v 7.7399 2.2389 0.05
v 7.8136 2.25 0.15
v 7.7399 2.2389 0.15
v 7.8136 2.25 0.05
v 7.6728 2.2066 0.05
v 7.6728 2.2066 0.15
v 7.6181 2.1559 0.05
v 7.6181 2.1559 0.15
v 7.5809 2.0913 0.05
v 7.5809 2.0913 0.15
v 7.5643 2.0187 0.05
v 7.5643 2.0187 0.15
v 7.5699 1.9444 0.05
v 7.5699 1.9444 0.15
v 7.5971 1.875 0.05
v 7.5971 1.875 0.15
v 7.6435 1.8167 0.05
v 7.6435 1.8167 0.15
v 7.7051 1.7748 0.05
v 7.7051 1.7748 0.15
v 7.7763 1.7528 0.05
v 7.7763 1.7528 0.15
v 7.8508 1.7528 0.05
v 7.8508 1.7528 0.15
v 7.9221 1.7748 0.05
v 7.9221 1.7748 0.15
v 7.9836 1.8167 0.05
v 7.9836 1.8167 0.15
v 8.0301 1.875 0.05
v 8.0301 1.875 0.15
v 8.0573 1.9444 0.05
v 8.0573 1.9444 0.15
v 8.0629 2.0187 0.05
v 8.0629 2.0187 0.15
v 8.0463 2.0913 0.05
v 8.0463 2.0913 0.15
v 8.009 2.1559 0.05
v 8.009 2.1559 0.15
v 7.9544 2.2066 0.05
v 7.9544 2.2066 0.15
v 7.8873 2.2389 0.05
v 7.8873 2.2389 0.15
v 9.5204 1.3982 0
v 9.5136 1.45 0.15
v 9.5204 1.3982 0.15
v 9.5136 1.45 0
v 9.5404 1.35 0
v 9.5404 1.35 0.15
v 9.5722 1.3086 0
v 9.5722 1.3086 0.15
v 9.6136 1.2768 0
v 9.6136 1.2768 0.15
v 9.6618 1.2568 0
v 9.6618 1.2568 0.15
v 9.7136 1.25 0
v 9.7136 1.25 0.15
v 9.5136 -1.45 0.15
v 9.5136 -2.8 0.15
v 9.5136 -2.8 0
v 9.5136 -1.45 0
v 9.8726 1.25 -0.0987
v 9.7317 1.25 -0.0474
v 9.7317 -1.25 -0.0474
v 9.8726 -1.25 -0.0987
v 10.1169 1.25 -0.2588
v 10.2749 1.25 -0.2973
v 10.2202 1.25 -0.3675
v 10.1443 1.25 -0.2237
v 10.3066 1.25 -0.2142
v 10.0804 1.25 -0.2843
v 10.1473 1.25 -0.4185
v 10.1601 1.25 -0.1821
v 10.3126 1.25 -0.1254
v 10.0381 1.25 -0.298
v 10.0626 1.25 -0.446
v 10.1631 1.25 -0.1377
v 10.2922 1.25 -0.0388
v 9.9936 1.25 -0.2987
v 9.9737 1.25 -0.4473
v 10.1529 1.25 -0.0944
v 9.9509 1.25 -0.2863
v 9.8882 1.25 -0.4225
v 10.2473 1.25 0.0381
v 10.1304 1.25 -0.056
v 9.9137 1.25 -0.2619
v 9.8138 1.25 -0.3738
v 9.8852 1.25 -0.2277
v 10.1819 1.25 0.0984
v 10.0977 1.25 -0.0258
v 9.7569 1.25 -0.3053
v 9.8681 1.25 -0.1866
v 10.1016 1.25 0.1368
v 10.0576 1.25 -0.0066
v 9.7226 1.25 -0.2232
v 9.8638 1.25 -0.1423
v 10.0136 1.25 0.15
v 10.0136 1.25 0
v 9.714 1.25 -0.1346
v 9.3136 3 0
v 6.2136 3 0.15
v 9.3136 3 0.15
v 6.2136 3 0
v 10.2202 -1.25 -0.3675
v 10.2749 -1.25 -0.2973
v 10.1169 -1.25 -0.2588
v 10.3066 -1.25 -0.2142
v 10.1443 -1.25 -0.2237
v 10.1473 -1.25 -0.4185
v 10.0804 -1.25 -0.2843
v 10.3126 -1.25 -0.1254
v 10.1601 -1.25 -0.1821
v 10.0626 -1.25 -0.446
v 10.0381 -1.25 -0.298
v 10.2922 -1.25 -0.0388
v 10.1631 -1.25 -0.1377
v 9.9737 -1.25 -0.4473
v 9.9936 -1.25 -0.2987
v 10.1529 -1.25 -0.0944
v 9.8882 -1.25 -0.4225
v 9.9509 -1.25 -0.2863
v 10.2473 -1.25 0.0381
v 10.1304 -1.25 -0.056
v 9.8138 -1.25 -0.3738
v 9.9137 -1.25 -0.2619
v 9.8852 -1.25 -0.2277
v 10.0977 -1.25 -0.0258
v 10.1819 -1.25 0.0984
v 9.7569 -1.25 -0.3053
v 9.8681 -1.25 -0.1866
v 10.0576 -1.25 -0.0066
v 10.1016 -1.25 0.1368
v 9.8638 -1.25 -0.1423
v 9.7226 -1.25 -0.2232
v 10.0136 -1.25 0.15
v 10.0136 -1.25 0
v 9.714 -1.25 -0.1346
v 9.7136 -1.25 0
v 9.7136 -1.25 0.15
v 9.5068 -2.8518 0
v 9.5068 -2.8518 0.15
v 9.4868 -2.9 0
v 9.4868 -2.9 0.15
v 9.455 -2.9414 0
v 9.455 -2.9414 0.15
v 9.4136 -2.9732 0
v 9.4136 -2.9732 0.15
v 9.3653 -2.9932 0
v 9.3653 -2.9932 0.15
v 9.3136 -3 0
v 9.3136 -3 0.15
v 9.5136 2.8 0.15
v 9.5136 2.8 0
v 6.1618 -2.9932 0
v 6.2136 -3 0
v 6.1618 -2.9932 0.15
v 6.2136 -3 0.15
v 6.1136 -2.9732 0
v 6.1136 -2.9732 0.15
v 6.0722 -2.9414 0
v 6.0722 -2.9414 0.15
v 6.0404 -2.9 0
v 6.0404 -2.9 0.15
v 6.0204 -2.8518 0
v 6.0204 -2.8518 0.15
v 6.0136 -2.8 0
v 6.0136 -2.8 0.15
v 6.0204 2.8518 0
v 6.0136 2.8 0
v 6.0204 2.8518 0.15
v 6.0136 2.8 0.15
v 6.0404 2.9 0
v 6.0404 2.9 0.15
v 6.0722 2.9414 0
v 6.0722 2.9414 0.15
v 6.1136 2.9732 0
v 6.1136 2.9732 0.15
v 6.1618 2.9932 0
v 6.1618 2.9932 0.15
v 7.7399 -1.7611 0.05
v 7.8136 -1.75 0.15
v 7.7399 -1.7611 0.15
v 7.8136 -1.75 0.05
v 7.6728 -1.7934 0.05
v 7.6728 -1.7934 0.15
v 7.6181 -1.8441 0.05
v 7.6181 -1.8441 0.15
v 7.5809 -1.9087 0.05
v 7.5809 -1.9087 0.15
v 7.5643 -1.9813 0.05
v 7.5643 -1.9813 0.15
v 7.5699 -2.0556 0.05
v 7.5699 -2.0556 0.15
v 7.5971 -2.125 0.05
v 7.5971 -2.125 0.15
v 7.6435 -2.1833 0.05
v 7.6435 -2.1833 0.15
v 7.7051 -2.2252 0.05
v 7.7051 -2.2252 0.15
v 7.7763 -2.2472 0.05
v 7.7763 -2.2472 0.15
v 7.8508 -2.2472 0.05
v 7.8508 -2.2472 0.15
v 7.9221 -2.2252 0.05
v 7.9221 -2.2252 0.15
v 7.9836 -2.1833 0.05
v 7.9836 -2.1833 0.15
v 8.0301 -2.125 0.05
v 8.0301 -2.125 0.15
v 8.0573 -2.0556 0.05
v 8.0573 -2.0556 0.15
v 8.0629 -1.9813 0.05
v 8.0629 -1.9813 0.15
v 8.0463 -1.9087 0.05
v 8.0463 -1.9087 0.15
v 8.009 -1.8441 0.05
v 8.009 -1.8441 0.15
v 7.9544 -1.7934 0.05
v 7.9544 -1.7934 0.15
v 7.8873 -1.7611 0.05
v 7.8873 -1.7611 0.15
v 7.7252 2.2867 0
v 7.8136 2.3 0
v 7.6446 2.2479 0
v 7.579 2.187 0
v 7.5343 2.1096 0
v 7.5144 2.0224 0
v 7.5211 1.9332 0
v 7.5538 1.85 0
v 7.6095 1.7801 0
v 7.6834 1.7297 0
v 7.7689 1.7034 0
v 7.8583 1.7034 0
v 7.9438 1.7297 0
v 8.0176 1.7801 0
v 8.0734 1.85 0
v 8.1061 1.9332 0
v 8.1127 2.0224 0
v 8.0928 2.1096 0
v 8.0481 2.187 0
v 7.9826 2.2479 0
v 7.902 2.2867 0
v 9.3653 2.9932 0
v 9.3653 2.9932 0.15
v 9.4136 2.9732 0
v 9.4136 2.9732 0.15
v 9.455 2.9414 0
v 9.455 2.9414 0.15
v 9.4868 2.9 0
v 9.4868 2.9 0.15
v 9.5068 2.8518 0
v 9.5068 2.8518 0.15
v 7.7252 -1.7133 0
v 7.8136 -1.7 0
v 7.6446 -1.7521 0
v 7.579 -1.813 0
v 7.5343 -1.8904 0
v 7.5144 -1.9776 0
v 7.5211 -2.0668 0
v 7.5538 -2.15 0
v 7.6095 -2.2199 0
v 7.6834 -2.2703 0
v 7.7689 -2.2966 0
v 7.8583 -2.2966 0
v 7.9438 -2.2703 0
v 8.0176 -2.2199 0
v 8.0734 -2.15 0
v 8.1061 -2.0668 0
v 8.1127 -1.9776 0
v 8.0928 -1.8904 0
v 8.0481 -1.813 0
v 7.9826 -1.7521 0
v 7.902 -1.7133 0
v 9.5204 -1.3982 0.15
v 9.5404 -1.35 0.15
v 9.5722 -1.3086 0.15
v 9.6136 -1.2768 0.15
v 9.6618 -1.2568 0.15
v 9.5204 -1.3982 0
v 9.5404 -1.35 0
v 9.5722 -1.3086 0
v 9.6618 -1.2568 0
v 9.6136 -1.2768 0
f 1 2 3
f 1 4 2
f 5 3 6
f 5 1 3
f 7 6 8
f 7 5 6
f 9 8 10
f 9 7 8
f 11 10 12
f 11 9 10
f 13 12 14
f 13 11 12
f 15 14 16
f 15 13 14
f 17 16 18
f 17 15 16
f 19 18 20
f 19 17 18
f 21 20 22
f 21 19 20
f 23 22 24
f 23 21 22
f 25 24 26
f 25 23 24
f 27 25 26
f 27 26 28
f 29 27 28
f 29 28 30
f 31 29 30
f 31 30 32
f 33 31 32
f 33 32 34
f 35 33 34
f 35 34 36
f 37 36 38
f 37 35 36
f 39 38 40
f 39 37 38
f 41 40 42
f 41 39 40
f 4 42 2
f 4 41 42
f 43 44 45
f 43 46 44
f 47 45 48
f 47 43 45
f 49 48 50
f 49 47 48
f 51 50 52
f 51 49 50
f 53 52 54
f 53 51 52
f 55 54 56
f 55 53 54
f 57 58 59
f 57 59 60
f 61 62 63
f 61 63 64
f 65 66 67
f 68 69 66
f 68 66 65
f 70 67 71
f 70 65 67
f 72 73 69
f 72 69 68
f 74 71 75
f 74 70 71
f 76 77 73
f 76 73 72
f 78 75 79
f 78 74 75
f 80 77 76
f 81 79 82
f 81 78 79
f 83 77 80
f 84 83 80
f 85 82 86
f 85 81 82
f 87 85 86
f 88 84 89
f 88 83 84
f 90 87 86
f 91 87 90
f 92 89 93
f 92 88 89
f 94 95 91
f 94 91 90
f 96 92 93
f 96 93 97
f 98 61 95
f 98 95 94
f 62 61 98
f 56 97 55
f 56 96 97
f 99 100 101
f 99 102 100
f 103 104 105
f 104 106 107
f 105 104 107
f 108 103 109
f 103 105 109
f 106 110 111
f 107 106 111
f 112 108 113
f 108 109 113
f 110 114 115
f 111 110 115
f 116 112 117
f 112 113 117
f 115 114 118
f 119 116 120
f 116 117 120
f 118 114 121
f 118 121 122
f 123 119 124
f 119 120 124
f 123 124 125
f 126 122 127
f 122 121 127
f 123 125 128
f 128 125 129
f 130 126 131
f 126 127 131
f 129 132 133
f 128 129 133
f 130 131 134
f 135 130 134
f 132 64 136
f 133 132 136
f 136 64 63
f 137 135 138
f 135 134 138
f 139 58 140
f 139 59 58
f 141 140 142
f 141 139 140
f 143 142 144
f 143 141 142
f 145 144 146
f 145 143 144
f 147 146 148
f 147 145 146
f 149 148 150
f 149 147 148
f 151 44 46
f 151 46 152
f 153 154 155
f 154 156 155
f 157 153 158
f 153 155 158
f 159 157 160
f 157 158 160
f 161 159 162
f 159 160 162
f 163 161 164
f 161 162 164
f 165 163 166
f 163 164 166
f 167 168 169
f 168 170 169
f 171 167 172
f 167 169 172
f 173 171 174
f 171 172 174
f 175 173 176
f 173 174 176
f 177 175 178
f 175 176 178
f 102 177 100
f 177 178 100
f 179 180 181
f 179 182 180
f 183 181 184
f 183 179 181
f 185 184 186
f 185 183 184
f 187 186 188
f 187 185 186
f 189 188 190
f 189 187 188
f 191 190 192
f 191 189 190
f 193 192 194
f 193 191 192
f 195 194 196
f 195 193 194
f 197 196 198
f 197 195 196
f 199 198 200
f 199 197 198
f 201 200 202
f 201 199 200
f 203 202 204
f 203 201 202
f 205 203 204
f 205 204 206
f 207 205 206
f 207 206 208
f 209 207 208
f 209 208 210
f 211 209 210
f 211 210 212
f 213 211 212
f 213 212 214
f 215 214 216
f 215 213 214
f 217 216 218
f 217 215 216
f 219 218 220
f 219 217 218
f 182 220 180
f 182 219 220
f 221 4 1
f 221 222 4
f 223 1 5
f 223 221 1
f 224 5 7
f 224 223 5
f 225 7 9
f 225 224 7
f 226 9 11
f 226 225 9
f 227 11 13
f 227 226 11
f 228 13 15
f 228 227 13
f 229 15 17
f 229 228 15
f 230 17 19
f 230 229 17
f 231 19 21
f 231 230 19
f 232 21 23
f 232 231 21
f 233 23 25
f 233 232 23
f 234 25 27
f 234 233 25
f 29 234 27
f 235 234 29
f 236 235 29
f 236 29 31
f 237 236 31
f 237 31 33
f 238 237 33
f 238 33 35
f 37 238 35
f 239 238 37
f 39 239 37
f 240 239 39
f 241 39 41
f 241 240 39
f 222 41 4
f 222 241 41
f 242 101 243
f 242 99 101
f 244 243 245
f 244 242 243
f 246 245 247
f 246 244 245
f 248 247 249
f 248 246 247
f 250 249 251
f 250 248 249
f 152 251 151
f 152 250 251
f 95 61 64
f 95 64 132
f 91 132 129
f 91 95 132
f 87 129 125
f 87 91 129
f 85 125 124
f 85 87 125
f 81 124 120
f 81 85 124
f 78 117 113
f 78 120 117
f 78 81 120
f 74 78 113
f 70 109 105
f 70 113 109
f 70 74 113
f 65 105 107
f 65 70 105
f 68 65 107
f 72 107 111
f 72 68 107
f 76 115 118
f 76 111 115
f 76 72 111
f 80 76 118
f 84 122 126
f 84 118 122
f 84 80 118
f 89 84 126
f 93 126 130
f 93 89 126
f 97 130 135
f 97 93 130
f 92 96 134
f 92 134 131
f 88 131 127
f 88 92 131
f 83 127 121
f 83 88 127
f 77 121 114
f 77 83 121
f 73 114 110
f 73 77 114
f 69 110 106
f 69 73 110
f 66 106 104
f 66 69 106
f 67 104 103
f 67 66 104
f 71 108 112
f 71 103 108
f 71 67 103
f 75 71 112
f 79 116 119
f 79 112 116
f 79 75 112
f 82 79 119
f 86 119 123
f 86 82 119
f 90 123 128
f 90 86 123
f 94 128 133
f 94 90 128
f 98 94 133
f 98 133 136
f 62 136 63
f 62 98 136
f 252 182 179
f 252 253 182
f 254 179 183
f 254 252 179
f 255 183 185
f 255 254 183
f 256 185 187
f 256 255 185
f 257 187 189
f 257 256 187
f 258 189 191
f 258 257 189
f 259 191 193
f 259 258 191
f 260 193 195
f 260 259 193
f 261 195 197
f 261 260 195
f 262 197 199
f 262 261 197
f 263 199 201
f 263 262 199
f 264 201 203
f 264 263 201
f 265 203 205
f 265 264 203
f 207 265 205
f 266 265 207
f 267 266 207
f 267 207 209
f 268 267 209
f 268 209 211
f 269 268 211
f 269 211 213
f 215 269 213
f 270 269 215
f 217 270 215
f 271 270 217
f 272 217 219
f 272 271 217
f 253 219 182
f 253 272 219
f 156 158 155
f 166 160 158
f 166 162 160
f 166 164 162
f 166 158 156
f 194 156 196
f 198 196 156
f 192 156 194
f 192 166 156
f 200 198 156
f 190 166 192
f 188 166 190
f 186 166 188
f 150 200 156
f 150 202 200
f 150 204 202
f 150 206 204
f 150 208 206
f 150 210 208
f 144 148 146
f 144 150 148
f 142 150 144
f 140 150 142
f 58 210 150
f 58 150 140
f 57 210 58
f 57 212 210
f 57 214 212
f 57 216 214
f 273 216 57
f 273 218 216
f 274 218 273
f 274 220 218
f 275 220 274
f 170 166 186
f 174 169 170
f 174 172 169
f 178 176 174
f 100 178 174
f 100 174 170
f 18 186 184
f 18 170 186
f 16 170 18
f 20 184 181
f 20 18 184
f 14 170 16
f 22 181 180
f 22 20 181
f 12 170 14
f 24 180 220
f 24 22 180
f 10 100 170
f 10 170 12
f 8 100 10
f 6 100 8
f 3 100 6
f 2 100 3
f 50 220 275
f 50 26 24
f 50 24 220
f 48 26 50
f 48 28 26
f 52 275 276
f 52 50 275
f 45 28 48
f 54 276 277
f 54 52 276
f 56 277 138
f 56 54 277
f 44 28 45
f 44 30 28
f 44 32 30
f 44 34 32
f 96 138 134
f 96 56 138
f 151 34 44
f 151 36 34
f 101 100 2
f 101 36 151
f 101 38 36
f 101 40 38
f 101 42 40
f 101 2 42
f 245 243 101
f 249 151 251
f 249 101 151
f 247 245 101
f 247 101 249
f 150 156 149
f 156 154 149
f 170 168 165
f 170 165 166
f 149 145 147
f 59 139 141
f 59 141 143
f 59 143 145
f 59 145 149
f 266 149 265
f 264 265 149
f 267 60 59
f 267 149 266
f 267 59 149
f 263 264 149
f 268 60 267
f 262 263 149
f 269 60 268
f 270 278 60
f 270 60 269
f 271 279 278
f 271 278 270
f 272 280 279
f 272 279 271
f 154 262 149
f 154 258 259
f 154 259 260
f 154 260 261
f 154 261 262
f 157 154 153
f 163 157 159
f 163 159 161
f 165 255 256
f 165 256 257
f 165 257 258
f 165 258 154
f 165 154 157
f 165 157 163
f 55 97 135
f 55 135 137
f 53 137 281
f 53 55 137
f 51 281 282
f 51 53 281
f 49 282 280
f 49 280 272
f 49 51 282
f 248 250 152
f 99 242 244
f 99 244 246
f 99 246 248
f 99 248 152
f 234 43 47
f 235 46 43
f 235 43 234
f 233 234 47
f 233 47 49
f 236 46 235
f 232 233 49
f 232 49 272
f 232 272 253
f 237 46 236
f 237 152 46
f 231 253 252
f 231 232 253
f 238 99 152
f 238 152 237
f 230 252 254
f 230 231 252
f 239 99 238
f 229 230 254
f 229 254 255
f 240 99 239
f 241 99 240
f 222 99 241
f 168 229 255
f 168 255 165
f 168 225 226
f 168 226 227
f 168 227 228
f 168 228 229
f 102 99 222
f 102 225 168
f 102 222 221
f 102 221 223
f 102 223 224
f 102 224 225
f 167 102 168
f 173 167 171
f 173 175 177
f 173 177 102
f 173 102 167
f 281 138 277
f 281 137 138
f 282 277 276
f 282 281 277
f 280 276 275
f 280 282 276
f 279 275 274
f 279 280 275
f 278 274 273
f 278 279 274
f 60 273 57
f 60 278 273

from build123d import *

# Parameters (mm, degrees)
BASE_FLANGE1_DEPTH                             = 3
CUT_EXTRUDE1_DEPTH                             = 11.75046698
CUT_EXTRUDE1_DEPTH_BACK                        = 11.75046698
SKETCH10_W                                     = 0.8
SKETCH10_H                                     = 1.75
FILLET1_R                                      = 0.2
CSK_FOR_M3_FLAT_HEAD_MACHINE_SCREW1_AT_2_COUNT = 2
CSK_FOR_M3_FLAT_HEAD_MACHINE_SCREW1_AT_2_PITCH = 4


# Sheet-metal steps are written as plain solids
with BuildPart() as part:
    # Sketch5 → Base-Flange1 (new, symmetric)
    with BuildSketch(Plane(origin=(0, 0, 0), x_dir=(1, 0, 0), z_dir=(0, 1, 0))):
        with BuildLine():
            ThreePointArc((9.872631336, 0.098696979), (10.099621695, 0.272872807), (10.013585229, 0))
            Line((10.013585229, 0), (6.013585229, 0))
            Line((6.013585229, 0), (6.013585229, -0.15))
            Line((6.013585229, -0.15), (10.013585229, -0.15))
            ThreePointArc((10.013585229, -0.15), (10.18565816, 0.395745613), (9.731677443, 0.047393957))
            Line((9.731677443, 0.047393957), (9.872631336, 0.098696979))
        make_face()
    extrude(amount=BASE_FLANGE1_DEPTH, both=True)

    # Sketch10 → Cut-Extrude1 (cut, two sides: drawn at the far end of the back side and taken through both)
    with BuildSketch(Plane(origin=(0, 0, 0), x_dir=(-1, 0, 0), z_dir=(0, 0, -1)).offset(-CUT_EXTRUDE1_DEPTH_BACK)):
        with Locations((-9.913585229, 2.125)):
            Rectangle(SKETCH10_W, SKETCH10_H)
        with Locations((-9.913585229, -2.125)):
            Rectangle(SKETCH10_W, SKETCH10_H)
    extrude(amount=CUT_EXTRUDE1_DEPTH + CUT_EXTRUDE1_DEPTH_BACK, mode=Mode.SUBTRACT)

    # Fillet1
    fillet1_edges = [part.edges().sort_by_distance(p)[0] for p in [
        (6.013585229, 3, 0.075),
        (9.513585229, 1.25, 0.075),
        (9.513585229, 3, 0.075),
        (6.013585229, -3, 0.075),
        (9.513585229, -3, 0.075),
        (9.513585229, -1.25, 0.075),
    ]]
    fillet(fillet1_edges, radius=FILLET1_R)

    # Sketch13 → CSK for M3 Flat Head Machine Screw1 (revolve, cut)
    with BuildSketch(Plane(origin=(7.813585229, 2, 0), x_dir=(0, 1, 0), z_dir=(1, 0, 0))):
        Polygon((0, 0), (0, 0.15), (0.25, 0.15), (0.25, 0.05), (0.3, 0), align=None)
    csk_for_m3_flat_head_machine_screw1 = revolve(axis=Axis((7.813585229, 2, -6.35), (0, 0, 1)), mode=Mode.SUBTRACT)

    # CSK for M3 Flat Head Machine Screw1 at 2: CSK for M3 Flat Head Machine Screw1 ×2
    with Locations(*[(0, -i * CSK_FOR_M3_FLAT_HEAD_MACHINE_SCREW1_AT_2_PITCH, 0) for i in range(1, CSK_FOR_M3_FLAT_HEAD_MACHINE_SCREW1_AT_2_COUNT)]):
        add(csk_for_m3_flat_head_machine_screw1, mode=Mode.SUBTRACT)


solid = part.part
